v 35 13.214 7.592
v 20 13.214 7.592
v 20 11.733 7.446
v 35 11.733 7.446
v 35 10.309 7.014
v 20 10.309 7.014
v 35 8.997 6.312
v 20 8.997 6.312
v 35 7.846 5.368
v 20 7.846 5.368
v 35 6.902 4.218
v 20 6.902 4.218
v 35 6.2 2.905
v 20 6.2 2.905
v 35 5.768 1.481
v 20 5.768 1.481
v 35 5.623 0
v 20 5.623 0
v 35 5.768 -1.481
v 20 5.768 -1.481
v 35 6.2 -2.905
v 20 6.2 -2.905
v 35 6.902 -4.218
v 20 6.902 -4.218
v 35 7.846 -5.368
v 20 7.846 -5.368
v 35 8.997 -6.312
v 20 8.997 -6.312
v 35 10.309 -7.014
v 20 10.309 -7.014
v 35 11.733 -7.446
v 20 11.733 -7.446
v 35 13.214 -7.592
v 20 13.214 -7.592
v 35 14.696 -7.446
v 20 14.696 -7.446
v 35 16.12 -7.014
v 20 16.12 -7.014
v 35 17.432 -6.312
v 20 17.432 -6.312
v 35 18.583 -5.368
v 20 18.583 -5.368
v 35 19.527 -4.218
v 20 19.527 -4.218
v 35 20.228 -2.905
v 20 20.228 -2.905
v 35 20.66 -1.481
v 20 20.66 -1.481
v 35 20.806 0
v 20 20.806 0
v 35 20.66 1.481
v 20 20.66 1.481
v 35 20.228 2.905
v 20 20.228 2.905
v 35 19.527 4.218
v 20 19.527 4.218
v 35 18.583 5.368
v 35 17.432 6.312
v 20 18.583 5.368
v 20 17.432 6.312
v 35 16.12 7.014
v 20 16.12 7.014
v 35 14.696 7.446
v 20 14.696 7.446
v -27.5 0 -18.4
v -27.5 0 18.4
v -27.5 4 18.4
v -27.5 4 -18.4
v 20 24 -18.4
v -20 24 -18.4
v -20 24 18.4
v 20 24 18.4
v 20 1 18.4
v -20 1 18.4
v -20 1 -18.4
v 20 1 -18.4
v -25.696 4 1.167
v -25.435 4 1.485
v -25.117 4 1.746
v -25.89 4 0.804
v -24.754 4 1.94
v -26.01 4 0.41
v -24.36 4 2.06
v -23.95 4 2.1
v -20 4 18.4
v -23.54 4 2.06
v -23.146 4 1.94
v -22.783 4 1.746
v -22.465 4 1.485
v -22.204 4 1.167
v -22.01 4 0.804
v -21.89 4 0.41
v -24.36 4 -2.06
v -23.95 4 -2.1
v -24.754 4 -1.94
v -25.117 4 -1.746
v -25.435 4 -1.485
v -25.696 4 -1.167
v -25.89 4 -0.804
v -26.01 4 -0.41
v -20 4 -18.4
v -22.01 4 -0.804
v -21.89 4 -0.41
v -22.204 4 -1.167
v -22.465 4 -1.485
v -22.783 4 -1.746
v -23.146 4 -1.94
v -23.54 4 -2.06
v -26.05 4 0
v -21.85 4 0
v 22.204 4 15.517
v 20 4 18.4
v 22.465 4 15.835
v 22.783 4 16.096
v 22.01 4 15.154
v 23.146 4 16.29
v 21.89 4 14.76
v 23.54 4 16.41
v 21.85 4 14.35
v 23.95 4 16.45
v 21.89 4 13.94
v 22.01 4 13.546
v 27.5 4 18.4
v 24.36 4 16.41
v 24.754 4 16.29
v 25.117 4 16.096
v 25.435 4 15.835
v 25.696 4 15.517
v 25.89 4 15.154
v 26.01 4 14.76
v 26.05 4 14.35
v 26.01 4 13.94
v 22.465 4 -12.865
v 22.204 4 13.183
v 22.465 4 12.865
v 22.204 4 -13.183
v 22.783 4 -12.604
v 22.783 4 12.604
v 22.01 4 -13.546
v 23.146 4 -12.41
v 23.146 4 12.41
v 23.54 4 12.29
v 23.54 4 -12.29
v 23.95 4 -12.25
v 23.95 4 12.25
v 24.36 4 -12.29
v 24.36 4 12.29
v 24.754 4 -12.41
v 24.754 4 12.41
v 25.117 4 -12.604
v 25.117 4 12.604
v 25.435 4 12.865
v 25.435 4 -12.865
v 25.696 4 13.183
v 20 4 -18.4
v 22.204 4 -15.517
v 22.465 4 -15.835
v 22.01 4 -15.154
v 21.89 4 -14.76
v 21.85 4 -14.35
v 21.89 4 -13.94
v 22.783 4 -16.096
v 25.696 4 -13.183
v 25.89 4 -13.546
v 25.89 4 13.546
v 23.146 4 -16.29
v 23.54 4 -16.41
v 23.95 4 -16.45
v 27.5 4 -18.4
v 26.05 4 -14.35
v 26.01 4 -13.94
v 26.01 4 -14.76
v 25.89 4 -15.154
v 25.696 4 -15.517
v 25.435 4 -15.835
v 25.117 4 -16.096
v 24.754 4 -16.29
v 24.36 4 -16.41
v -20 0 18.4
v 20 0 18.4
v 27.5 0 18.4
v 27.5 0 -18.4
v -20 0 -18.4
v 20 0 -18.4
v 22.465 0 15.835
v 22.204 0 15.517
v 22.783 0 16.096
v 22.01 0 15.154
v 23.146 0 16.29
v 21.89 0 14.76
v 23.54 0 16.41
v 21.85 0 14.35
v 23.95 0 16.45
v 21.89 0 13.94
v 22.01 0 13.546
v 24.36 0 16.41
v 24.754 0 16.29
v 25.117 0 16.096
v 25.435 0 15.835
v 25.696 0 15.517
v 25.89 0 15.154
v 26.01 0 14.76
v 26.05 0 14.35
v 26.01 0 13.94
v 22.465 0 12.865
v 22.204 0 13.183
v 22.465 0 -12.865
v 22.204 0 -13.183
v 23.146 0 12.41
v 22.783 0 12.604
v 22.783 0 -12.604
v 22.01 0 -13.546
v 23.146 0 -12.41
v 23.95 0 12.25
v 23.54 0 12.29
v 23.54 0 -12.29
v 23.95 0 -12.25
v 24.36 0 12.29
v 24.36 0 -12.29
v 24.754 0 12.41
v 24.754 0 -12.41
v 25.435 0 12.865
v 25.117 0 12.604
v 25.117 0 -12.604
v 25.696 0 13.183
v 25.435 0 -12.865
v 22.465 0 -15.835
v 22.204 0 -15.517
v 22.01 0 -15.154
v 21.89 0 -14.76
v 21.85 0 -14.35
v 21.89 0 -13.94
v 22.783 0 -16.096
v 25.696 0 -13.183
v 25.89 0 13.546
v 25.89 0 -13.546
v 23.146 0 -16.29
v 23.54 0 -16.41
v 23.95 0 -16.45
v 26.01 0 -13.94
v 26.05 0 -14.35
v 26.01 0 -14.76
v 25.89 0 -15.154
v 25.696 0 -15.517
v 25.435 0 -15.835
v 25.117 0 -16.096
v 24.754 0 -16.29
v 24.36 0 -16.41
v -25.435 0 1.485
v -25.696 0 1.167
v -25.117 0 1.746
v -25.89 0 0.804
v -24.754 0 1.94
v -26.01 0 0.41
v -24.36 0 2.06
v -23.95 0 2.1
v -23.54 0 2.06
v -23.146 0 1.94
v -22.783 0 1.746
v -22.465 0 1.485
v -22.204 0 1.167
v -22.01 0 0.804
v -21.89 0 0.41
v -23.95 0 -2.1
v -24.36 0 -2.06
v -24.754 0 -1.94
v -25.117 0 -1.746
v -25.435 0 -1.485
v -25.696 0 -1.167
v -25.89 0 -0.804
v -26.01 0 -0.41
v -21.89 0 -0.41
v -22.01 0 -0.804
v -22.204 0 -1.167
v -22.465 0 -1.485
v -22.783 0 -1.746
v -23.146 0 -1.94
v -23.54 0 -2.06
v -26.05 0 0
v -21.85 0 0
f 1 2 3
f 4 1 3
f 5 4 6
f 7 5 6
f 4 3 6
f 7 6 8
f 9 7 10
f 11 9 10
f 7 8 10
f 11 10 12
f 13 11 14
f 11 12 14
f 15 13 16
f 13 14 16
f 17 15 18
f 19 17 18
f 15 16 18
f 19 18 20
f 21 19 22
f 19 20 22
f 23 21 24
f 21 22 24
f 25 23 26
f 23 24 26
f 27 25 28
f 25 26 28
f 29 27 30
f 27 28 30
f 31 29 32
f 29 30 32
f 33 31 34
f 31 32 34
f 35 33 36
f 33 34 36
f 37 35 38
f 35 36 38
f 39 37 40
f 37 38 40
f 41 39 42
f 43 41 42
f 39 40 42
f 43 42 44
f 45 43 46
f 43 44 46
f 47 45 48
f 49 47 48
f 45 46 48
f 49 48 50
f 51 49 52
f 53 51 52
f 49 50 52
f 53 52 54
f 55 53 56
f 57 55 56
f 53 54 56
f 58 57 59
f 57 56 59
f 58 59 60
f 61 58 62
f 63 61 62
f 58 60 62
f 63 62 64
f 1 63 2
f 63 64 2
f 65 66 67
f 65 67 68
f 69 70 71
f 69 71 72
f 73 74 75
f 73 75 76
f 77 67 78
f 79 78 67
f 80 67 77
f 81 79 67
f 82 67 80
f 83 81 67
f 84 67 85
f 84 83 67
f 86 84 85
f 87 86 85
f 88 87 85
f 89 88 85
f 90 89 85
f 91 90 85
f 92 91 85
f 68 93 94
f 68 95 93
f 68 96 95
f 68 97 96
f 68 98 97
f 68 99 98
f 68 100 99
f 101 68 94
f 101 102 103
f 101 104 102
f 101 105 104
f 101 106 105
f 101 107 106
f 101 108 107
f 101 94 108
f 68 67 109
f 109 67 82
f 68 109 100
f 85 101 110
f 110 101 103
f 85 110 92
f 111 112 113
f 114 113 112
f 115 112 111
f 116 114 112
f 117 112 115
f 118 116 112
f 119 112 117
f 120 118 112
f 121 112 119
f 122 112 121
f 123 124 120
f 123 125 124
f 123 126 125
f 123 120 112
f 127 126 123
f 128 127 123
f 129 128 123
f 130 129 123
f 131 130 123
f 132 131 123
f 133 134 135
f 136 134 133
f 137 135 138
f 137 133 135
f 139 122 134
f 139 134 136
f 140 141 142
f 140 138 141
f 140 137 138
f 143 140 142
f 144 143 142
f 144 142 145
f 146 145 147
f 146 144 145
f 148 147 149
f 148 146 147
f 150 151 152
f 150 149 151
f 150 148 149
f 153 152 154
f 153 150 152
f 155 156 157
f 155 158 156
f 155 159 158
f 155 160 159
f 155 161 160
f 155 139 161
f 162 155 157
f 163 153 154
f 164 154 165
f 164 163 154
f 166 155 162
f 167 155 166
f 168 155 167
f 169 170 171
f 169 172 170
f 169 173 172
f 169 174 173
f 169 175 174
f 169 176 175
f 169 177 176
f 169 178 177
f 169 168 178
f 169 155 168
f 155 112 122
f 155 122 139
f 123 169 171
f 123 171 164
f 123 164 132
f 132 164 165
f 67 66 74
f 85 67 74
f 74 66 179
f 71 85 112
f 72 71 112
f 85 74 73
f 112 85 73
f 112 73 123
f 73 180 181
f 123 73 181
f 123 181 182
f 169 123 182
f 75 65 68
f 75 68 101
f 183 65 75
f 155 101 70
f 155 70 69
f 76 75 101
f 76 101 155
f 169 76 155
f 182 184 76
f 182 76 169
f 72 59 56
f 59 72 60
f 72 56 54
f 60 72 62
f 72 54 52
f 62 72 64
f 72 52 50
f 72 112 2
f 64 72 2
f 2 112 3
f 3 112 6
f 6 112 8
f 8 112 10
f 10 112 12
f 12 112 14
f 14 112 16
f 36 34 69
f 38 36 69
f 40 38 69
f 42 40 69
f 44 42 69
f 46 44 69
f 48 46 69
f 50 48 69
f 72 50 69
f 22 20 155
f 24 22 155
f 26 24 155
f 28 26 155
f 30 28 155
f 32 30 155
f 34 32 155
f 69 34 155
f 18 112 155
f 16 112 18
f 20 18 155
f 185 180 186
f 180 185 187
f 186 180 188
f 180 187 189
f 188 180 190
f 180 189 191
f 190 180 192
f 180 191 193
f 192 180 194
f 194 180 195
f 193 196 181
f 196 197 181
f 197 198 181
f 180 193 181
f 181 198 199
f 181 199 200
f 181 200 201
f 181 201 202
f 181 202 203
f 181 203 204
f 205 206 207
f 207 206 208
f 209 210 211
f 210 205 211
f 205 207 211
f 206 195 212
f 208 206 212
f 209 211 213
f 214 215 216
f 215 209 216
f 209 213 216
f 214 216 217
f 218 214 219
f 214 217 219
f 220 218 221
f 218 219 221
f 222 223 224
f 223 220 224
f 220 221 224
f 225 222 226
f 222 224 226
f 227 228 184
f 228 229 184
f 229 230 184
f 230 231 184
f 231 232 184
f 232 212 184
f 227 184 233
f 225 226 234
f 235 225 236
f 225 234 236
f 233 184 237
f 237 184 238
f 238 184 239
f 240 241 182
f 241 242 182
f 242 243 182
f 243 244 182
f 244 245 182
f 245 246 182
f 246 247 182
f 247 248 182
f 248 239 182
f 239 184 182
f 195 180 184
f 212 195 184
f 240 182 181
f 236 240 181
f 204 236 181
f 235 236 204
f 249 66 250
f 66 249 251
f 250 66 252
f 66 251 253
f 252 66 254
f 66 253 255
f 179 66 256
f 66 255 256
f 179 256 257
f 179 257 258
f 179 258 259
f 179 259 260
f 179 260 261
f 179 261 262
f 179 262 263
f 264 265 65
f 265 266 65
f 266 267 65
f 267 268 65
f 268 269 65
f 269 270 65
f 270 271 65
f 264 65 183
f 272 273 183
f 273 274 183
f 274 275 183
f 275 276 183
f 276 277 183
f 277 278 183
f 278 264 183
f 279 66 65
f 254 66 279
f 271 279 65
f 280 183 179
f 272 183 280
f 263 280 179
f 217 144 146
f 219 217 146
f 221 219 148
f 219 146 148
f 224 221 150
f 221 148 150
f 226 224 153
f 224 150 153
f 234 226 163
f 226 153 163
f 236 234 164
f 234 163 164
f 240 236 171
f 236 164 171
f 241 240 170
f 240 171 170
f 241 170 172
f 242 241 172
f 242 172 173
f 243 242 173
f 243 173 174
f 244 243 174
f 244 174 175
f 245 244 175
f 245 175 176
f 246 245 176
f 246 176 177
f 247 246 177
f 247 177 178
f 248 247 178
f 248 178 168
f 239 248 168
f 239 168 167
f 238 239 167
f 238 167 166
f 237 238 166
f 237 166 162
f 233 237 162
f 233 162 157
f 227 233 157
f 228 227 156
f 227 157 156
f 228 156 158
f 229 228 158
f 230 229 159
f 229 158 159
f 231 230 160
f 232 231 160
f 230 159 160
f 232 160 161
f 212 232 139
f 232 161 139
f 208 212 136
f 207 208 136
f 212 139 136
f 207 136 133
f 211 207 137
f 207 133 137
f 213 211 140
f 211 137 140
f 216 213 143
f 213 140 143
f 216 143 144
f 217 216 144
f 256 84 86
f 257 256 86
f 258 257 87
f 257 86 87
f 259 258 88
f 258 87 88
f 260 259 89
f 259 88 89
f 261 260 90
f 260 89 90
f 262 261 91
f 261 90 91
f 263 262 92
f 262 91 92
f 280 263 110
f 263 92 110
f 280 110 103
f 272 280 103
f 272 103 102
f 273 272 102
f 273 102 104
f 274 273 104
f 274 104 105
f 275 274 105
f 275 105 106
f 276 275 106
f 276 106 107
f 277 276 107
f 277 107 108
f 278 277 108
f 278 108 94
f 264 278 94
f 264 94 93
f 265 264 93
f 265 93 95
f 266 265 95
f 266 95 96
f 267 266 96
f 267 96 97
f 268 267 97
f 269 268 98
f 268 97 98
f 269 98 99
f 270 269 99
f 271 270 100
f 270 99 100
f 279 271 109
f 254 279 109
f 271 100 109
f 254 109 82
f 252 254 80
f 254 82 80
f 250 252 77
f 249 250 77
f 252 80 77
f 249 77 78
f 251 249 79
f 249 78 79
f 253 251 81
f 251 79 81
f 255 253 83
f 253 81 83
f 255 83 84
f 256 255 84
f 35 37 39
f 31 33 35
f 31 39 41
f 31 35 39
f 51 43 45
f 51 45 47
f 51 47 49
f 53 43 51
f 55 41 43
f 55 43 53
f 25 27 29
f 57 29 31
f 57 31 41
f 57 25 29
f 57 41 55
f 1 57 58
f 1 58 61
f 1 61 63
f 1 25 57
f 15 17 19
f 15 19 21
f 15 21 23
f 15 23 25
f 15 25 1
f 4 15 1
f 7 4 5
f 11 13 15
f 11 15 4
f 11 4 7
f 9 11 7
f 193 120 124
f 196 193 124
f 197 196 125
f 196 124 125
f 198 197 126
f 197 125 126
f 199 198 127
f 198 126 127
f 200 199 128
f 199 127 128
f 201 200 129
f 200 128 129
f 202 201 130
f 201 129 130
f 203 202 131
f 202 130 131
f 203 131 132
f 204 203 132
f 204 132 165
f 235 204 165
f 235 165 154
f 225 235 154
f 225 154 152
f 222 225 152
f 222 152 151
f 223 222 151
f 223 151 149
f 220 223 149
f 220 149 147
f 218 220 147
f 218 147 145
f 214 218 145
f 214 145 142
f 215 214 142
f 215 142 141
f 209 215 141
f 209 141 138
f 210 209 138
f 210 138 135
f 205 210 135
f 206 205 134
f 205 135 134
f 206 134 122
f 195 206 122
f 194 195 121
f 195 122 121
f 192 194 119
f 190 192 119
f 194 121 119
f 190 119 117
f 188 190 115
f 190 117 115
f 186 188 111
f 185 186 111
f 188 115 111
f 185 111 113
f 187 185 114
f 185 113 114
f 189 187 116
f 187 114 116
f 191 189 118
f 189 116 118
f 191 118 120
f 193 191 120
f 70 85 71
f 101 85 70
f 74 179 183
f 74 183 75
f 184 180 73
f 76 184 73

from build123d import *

# Parameters (mm, degrees)
SKETCH_1_W          = 55
SKETCH_1_H          = 36.8
EXTRUDE_1_DEPTH     = 4
SKETCH_2_W          = 40
SKETCH_2_H          = 36.8
EXTRUDE_2_DEPTH     = 20
SKETCH_3_W          = 40
SKETCH_3_H          = 2
CUT_EXTRUDE_1_DEPTH = 200
SKETCH_4_R          = 2.1
CUT_EXTRUDE_2_DEPTH = 200
SKETCH_5_R          = 7.591855359
EXTRUDE_3_DEPTH     = 15


with BuildPart() as part:
    # 草图1 → 凸台-拉伸1 (new body)
    with BuildSketch(Plane(origin=(0, 0, 0), x_dir=(1, 0, 0), z_dir=(0, 1, 0))):
        Rectangle(SKETCH_1_W, SKETCH_1_H)
    extrude(amount=EXTRUDE_1_DEPTH)

    # 草图2 → 凸台-拉伸2 (add)
    with BuildSketch(Plane(origin=(0, 4, 0), x_dir=(1, 0, 0), z_dir=(0, 1, 0))):
        Rectangle(SKETCH_2_W, SKETCH_2_H)
    extrude(amount=EXTRUDE_2_DEPTH)

    # 草图3 → 切除-拉伸1 (cut)
    with BuildSketch(Plane.XY.offset(18.4)):
        Rectangle(SKETCH_3_W, SKETCH_3_H)
    extrude(amount=-CUT_EXTRUDE_1_DEPTH, mode=Mode.SUBTRACT)

    # 草图4 → 切除-拉伸2 (cut)
    with BuildSketch(Plane(origin=(0, 4, 0), x_dir=(1, 0, 0), z_dir=(0, 1, 0))):
        with Locations(Location((-23.95, 0, 0), (0, 0, 270))):
            Circle(SKETCH_4_R)
        with Locations(Location((23.95, 14.35, 0), (0, 0, 270))):
            Circle(SKETCH_4_R)
        with Locations(Location((23.95, -14.35, 0), (0, 0, 270))):
            Circle(SKETCH_4_R)
    extrude(amount=-CUT_EXTRUDE_2_DEPTH, mode=Mode.SUBTRACT)

    # 草图5 → 凸台-拉伸3 (add)
    with BuildSketch(Plane(origin=(20, 0, 0), x_dir=(0, 0, -1), z_dir=(1, 0, 0))):
        with Locations(Location((0, 13.214422917, 0), (0, 0, 180))):
            Circle(SKETCH_5_R)
    extrude(amount=EXTRUDE_3_DEPTH)


solid = part.part
